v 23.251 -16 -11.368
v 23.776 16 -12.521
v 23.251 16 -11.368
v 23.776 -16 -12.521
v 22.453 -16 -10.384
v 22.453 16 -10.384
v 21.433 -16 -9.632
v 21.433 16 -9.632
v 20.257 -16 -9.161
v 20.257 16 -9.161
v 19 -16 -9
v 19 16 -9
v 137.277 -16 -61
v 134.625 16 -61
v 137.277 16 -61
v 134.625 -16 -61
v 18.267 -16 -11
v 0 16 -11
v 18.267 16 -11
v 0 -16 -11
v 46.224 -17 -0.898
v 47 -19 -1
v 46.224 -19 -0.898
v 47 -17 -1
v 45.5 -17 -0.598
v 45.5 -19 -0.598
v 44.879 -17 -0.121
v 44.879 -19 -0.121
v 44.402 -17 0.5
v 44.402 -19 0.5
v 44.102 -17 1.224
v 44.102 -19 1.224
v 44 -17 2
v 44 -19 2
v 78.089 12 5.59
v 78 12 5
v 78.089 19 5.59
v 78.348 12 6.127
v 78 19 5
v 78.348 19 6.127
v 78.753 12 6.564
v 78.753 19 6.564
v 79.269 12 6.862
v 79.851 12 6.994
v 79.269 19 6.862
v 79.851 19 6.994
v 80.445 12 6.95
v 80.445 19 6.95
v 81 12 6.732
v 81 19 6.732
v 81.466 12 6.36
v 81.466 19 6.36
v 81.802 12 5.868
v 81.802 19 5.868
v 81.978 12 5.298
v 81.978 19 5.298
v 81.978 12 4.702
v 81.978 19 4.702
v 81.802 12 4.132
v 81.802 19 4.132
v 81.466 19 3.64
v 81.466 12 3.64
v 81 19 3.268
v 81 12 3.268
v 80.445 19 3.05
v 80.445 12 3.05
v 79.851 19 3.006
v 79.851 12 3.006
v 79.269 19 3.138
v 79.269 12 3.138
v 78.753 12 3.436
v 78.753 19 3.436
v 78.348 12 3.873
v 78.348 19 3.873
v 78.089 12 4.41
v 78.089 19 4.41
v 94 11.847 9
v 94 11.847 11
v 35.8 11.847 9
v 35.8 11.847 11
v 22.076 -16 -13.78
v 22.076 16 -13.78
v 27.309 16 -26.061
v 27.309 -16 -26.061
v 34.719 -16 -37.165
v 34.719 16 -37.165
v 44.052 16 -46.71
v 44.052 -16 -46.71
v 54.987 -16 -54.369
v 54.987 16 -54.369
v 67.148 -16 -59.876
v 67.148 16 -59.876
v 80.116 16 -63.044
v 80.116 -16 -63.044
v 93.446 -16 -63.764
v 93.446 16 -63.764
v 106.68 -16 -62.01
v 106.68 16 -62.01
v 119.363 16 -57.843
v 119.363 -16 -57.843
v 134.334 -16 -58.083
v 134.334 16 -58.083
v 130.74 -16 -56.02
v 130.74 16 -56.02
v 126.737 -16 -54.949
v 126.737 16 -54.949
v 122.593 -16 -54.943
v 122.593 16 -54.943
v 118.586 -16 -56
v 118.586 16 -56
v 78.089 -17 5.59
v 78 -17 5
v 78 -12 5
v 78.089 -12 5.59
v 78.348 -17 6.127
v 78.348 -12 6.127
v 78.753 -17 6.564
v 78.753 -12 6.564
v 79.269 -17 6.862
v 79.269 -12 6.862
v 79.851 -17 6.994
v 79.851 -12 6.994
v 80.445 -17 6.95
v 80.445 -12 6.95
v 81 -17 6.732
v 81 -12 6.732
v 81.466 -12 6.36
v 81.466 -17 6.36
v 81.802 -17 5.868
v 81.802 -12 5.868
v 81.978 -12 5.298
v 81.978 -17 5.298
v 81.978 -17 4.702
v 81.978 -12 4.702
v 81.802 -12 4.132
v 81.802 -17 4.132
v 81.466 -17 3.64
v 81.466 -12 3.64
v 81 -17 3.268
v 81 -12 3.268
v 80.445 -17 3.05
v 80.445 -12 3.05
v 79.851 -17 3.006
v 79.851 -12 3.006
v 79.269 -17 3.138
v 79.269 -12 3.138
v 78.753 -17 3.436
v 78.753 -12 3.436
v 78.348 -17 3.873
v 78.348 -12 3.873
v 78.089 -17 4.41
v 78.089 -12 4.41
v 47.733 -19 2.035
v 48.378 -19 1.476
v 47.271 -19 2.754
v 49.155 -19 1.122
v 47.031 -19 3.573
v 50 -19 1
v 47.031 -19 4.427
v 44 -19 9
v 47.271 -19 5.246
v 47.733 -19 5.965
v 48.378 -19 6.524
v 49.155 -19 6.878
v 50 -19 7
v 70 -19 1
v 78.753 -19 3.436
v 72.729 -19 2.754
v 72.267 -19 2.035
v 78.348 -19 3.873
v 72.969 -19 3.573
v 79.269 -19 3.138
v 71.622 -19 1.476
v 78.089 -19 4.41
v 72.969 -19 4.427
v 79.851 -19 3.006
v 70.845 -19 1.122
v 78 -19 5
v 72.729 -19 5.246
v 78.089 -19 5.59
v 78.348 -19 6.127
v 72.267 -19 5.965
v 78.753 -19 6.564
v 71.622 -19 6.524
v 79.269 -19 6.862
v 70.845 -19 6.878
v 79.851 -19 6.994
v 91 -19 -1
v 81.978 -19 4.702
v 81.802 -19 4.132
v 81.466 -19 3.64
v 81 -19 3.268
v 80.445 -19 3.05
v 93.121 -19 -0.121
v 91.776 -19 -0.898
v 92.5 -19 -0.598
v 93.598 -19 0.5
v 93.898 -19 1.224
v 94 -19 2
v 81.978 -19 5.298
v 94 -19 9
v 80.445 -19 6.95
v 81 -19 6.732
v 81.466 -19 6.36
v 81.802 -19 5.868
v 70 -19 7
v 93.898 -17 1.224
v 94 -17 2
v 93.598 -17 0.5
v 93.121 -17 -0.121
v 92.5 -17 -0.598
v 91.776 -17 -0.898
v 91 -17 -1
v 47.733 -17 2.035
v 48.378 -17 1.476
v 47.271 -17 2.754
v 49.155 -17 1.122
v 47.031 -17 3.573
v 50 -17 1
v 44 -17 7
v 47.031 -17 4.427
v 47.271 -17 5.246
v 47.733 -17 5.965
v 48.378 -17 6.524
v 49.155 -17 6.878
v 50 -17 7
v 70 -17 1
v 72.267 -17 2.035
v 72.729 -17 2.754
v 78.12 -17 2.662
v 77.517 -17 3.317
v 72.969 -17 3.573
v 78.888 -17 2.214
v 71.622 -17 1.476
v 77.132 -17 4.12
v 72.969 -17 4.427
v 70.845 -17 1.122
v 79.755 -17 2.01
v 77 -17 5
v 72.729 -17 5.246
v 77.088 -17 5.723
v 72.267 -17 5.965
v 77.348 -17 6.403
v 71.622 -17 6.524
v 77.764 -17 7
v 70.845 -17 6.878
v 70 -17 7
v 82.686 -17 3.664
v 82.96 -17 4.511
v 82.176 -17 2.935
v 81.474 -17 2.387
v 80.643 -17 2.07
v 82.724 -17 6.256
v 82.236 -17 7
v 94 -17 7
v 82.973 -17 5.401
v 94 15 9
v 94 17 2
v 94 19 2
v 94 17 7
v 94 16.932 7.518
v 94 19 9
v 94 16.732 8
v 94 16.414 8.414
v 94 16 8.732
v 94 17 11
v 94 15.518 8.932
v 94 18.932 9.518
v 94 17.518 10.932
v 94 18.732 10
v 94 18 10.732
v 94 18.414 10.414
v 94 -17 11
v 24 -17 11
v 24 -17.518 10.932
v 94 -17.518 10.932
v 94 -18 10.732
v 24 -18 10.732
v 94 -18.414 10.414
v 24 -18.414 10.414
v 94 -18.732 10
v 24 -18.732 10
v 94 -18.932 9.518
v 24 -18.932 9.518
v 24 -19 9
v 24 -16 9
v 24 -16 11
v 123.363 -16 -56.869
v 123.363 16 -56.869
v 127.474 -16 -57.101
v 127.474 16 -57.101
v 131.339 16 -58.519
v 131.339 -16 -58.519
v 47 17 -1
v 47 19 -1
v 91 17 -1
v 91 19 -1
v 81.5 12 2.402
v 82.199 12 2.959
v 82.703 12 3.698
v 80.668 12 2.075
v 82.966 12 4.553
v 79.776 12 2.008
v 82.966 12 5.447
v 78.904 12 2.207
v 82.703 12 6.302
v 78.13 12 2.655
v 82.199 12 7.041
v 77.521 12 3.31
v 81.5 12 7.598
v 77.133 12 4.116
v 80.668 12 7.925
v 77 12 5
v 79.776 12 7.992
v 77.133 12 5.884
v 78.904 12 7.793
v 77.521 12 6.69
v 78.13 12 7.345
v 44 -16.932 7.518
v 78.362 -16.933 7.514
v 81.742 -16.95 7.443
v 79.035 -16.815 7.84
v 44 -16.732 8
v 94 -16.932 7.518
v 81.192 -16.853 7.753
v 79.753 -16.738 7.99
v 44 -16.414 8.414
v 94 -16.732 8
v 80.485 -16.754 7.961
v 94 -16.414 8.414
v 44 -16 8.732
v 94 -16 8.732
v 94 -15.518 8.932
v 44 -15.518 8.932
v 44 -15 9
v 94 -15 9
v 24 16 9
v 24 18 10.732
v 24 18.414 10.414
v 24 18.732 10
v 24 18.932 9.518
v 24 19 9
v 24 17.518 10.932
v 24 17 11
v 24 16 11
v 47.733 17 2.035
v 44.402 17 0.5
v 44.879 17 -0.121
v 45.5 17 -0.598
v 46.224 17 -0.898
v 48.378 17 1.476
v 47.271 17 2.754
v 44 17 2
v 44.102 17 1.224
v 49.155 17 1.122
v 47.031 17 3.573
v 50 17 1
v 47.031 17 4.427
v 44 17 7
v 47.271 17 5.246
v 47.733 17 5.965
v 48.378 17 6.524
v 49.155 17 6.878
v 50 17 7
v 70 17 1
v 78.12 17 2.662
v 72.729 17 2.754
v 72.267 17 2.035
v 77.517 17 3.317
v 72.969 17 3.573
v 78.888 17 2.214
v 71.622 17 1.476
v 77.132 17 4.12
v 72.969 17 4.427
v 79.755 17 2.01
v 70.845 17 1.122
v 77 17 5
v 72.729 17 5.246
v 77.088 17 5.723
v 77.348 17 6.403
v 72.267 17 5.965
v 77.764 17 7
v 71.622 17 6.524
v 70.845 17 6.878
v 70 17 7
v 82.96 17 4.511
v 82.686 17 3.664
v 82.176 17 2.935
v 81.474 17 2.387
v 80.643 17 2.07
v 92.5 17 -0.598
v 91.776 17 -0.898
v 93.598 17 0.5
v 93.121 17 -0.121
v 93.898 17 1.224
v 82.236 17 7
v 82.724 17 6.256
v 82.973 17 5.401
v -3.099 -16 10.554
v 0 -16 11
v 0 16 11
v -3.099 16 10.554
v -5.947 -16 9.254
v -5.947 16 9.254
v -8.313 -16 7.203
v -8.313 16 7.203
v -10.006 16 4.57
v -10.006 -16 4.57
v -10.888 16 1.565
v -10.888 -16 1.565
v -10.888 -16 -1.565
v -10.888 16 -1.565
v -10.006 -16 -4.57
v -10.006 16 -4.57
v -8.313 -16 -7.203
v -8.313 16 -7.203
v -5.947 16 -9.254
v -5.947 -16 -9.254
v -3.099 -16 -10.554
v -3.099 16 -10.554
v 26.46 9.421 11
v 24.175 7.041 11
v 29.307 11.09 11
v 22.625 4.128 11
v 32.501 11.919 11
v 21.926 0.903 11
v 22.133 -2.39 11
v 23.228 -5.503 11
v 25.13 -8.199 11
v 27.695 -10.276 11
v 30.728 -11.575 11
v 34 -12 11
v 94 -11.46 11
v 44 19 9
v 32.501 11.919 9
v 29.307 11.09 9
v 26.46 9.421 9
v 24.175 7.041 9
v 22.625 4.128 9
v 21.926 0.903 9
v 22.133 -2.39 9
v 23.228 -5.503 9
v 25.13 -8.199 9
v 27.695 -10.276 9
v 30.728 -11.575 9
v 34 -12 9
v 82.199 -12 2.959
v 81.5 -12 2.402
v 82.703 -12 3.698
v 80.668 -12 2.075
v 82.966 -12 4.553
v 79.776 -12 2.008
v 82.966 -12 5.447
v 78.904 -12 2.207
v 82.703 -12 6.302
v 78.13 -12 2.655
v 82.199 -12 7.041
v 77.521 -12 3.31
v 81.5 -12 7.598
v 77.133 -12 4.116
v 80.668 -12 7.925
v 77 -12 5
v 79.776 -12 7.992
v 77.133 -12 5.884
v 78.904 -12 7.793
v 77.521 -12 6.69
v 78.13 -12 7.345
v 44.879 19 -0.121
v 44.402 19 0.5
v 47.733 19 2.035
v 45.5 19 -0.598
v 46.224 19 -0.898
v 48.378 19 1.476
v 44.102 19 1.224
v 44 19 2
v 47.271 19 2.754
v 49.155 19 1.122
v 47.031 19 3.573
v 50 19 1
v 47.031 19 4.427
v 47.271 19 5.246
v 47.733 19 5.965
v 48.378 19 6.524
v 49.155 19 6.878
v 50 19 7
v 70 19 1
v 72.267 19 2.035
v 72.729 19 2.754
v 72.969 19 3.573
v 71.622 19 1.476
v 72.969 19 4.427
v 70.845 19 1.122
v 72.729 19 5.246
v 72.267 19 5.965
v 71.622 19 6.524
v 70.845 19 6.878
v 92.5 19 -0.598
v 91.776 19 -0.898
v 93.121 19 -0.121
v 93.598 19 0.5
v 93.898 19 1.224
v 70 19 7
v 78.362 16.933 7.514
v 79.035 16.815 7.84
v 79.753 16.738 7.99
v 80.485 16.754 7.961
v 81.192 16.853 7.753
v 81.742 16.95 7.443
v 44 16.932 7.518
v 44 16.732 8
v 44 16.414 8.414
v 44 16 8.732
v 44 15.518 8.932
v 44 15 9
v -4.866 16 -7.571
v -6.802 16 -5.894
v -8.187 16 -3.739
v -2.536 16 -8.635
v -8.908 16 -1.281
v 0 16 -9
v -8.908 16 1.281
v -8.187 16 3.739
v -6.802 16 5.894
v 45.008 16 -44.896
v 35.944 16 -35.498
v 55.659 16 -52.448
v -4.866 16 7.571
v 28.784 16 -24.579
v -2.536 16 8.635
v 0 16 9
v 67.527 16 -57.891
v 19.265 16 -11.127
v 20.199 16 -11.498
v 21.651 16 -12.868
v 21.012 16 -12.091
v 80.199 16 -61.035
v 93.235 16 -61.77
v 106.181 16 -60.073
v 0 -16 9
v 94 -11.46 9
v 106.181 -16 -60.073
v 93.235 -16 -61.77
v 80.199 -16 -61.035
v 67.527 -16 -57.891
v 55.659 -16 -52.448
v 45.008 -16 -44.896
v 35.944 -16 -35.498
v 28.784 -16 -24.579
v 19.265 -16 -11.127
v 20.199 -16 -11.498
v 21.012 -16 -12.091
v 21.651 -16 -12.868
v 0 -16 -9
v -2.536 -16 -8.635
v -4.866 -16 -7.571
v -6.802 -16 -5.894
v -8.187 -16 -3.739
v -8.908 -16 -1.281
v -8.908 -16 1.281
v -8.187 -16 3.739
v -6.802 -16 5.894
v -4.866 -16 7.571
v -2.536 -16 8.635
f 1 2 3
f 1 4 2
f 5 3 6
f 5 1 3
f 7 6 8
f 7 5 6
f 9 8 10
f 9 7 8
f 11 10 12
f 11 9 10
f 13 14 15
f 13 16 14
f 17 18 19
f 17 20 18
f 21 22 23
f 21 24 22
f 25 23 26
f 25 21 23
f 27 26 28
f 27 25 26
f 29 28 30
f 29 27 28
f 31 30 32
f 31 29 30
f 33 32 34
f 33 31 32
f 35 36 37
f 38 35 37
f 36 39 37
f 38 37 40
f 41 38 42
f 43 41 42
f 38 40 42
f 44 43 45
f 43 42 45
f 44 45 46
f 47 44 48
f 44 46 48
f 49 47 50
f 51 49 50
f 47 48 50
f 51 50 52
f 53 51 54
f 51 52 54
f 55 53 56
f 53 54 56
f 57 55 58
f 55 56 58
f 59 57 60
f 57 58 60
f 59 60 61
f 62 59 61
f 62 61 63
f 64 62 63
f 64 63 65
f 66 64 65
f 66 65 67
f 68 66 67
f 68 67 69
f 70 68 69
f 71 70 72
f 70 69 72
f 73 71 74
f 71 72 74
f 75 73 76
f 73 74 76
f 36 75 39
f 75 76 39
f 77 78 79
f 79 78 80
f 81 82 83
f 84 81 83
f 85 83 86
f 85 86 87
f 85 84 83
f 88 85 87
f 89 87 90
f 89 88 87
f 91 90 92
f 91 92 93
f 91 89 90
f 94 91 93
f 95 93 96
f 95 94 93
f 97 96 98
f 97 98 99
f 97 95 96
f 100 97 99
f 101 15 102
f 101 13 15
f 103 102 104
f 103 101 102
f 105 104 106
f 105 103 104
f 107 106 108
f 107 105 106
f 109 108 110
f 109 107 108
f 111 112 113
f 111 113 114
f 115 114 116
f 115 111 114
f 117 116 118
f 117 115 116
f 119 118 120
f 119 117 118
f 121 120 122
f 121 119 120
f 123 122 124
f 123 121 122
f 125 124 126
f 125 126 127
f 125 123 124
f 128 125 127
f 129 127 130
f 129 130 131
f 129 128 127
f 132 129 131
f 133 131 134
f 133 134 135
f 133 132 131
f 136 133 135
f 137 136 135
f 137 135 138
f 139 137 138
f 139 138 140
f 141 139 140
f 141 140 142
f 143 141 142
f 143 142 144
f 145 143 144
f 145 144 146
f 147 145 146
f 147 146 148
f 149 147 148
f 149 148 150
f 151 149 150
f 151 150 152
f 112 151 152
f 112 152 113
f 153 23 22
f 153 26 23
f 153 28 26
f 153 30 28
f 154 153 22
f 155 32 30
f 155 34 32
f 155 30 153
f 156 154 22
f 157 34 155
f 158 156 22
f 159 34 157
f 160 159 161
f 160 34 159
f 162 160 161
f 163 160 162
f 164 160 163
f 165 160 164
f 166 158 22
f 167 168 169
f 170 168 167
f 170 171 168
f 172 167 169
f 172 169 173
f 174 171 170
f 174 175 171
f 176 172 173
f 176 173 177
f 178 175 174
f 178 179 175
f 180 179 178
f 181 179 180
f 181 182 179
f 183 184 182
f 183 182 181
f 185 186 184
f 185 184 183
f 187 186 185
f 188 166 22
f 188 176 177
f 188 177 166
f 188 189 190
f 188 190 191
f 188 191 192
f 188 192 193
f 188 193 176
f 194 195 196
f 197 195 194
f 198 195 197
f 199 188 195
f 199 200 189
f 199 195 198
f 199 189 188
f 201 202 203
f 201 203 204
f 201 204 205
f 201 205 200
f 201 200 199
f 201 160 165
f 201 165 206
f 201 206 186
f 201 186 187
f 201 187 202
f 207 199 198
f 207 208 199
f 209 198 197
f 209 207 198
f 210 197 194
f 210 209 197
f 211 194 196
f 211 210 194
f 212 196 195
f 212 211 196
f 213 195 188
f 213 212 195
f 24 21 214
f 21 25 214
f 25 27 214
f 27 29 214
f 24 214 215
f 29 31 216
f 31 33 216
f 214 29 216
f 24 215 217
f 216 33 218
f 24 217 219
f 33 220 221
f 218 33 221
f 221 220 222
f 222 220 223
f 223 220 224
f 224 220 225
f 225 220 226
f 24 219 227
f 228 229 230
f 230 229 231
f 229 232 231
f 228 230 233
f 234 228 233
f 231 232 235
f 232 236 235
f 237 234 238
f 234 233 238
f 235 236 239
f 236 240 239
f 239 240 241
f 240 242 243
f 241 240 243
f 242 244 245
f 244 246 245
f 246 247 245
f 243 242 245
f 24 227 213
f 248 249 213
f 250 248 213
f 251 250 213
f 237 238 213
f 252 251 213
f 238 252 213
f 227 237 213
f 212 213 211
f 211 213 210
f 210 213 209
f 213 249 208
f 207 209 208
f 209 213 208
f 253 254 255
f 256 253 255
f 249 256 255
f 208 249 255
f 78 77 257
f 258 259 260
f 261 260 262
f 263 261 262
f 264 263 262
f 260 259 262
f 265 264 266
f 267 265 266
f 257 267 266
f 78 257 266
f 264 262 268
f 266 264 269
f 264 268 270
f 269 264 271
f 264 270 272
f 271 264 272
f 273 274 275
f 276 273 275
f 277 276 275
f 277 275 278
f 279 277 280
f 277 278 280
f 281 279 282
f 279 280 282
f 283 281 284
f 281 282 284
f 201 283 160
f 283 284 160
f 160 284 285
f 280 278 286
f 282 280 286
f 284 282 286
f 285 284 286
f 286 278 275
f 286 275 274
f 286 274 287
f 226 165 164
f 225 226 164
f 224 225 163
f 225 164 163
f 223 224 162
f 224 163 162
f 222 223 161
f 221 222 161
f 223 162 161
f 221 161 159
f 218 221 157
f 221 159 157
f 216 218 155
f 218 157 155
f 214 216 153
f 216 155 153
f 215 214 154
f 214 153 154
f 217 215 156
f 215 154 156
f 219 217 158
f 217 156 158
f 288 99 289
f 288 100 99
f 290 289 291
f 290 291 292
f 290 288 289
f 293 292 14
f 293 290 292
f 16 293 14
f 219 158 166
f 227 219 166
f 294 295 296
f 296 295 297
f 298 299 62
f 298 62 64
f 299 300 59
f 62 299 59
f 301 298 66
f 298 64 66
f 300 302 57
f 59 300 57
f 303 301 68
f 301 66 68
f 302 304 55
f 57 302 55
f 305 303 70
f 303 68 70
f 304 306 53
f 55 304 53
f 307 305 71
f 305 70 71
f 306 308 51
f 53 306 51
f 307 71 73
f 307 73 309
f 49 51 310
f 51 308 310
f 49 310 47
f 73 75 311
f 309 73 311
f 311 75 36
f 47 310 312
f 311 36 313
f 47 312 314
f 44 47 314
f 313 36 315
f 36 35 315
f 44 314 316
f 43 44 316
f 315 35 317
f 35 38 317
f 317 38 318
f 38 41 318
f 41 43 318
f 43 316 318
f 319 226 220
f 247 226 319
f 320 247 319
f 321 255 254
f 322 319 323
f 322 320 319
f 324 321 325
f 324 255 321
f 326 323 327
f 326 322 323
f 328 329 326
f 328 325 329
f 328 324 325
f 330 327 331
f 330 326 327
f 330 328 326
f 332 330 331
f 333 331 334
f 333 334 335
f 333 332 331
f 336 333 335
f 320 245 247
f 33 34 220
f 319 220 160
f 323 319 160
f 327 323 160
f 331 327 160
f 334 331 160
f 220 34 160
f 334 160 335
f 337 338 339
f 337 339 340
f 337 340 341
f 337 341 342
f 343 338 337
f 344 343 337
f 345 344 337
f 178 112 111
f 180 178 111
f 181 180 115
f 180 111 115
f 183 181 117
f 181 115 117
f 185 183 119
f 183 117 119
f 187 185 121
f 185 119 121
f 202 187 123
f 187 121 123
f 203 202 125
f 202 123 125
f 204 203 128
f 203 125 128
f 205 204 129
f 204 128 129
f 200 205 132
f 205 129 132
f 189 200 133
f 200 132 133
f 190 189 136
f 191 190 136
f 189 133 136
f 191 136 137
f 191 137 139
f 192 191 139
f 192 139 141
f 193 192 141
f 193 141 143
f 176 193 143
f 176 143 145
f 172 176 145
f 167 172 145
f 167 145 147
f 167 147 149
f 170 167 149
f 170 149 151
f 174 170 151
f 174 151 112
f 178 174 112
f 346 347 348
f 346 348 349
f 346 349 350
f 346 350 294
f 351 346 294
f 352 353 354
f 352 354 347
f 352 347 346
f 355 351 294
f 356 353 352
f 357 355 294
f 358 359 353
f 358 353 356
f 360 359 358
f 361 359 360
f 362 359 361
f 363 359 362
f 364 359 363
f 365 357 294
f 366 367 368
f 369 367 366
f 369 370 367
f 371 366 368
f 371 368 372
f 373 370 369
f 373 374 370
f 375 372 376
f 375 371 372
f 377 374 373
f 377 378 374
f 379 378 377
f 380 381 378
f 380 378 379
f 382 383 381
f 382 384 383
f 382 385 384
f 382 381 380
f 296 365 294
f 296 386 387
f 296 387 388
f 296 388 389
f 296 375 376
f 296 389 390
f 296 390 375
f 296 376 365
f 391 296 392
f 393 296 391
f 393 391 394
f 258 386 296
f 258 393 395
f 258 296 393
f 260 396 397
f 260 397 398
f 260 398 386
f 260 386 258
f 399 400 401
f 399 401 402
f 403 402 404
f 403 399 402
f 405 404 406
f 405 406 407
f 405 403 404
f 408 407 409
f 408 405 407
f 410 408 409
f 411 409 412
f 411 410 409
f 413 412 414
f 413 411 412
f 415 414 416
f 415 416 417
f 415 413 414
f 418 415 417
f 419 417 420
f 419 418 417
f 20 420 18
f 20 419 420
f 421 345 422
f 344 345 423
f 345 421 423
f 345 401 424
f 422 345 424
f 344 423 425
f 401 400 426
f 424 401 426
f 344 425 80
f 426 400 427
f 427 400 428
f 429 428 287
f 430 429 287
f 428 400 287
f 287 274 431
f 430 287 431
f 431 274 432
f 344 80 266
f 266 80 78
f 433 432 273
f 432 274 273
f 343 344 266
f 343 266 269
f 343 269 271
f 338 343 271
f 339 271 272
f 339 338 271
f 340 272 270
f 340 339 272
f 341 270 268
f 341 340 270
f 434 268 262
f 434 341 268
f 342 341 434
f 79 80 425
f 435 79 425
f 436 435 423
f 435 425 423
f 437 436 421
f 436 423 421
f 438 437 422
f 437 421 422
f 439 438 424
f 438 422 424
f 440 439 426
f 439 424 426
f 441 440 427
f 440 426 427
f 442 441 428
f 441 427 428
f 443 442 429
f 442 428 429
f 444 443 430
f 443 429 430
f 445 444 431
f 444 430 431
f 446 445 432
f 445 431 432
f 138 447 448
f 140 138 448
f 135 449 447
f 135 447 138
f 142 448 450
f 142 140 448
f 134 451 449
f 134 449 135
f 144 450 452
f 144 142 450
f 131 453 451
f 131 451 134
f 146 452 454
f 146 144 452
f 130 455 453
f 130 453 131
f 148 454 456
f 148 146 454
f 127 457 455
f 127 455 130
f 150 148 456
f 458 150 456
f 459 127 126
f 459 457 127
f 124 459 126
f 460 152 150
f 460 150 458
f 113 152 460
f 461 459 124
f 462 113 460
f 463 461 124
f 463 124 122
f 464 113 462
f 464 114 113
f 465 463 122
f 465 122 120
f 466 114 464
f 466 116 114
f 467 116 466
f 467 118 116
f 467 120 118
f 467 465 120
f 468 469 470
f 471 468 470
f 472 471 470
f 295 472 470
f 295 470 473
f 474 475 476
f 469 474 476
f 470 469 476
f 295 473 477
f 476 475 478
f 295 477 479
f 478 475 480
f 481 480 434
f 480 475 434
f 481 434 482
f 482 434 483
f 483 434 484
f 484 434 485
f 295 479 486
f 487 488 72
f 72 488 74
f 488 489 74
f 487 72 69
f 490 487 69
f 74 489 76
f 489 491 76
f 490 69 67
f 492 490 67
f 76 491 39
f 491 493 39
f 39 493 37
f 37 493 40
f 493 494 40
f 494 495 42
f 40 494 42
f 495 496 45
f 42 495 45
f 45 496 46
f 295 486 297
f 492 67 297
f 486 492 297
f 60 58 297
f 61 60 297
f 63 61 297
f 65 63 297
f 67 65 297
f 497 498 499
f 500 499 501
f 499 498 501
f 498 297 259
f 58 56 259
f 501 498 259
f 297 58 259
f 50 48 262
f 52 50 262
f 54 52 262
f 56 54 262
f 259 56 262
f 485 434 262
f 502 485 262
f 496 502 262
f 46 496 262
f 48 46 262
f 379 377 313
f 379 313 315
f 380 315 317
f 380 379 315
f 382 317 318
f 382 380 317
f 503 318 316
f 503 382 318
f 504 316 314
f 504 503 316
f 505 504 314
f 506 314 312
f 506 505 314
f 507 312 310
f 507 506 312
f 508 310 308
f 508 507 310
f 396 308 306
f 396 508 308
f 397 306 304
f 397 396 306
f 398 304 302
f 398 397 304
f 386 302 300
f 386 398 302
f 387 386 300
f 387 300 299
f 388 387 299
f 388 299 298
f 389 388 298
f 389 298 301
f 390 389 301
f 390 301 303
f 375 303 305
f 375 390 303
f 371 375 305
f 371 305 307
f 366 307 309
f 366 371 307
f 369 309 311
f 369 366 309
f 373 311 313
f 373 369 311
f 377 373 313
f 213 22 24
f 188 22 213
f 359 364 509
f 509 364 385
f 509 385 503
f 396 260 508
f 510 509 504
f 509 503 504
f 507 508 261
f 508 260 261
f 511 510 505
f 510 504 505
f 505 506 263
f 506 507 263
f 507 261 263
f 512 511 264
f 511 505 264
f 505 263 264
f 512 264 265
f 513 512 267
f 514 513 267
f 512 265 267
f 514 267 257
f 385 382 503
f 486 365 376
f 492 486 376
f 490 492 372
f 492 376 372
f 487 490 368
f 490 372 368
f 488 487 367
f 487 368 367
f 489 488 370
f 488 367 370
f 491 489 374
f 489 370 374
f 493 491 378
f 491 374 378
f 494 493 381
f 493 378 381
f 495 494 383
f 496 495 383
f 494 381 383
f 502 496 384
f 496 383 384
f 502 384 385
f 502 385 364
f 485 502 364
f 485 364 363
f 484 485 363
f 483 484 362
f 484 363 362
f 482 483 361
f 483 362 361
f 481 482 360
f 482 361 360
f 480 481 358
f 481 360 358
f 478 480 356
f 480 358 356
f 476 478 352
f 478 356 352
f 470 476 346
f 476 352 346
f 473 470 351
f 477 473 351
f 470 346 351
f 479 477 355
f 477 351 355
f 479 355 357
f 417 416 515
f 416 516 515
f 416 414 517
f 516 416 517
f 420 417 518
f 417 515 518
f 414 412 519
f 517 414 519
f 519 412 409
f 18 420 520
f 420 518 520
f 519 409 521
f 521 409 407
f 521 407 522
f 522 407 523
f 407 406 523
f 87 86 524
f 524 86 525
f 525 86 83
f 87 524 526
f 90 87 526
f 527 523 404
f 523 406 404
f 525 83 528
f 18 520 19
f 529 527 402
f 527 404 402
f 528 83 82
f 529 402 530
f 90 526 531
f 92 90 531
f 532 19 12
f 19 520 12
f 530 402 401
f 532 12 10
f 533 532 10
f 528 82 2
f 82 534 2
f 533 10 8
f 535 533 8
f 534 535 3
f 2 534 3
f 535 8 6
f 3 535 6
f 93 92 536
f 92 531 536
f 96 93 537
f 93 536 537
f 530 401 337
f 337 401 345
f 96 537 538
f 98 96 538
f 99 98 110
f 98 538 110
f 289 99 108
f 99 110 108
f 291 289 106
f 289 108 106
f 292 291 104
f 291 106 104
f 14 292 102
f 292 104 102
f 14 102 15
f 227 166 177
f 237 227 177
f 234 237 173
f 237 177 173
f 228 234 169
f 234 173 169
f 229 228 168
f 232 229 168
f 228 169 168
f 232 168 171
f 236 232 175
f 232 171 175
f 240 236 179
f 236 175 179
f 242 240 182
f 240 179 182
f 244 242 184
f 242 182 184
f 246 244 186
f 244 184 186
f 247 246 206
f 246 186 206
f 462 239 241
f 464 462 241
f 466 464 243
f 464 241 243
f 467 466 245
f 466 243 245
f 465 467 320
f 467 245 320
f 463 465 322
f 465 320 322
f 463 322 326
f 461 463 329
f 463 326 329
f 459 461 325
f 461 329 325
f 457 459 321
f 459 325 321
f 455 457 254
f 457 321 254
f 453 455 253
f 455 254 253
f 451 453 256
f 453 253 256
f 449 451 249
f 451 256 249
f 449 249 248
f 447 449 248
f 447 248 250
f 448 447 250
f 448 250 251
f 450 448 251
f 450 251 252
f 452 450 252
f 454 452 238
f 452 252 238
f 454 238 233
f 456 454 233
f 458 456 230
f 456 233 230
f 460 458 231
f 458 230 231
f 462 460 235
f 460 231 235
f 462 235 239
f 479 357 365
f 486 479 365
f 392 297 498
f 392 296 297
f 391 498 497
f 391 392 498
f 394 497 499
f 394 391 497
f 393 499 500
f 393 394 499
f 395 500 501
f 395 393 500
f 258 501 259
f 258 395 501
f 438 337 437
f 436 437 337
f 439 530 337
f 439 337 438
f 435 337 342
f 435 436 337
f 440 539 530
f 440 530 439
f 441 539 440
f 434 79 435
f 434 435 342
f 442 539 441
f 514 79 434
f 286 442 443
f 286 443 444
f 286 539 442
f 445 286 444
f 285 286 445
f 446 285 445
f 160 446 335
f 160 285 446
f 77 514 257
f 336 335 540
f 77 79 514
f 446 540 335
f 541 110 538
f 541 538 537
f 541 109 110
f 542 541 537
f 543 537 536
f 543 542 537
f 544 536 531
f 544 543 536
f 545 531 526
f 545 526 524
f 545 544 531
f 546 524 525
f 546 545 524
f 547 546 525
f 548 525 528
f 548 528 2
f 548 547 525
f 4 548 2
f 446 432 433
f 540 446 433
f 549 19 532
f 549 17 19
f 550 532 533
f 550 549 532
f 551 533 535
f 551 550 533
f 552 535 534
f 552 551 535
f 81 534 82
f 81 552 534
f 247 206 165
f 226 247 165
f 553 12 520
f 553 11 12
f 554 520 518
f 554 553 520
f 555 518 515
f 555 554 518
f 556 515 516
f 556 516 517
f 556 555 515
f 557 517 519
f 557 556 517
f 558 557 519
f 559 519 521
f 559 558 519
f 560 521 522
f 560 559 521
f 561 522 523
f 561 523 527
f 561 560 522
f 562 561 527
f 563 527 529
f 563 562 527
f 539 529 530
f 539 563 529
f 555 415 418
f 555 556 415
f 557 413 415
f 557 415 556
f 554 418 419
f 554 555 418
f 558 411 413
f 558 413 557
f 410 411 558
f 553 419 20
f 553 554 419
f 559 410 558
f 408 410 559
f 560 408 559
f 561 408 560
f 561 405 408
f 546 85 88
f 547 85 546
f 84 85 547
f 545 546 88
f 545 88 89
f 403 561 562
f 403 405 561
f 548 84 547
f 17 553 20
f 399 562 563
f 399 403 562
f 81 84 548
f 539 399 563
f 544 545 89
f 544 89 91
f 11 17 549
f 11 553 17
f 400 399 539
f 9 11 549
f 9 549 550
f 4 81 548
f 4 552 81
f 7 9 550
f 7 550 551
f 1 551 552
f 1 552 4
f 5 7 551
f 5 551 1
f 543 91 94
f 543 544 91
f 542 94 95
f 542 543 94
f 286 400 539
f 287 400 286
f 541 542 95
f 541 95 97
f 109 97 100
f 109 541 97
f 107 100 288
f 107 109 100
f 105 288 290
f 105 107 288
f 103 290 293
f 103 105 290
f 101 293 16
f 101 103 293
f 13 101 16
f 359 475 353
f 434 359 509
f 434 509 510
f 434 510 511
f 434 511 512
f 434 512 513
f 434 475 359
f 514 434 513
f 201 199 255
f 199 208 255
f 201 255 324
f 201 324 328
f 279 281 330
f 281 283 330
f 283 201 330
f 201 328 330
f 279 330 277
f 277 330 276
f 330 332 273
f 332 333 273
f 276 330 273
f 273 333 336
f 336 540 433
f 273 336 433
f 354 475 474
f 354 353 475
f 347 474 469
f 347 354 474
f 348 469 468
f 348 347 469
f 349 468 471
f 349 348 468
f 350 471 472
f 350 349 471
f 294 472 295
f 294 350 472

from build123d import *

# Parameters (mm, degrees)
F1_DEPTH  = 16
F2_W      = 70
F2_H      = 3
F3_DEPTH  = 2
F4_W      = 50
F4_H      = 12
F5_DEPTH  = 2
F6_R      = 2
F9_DEPTH  = 2
F11_DEPTH = 38.001
F13_D     = 4
F14_R     = 3
F14_R_2   = 2
F15_DEPTH = 5
F16_R     = 3


# Not quite as in the source:
# - a pattern or mirror of a feature is missing from the dataset's text; its kind, count and spacing are read off the source's solid


with BuildPart() as f1:
    # F0 (on Front) → F1 (new body)
    with BuildSketch(Plane.XZ):
        with BuildLine():
            ThreePointArc((0, -9), (-9, 0), (0, 9))
            Line((0, 9), (94, 9))
            Line((94, 9), (94, 11))
            Line((94, 11), (0, 11))
            ThreePointArc((0, 11), (-11, 0), (0, -11))
            Line((0, -11), (18.2665281953, -11))
            ThreePointArc((18.2665281953, -11), (20.6244584971, -11.7688756304), (22.0759112253, -13.779917654))
            ThreePointArc((22.0759112253, -13.779917654), (60.9393672504, -57.4049197249), (119.3629664678, -57.8431826489))
            ThreePointArc((119.3629664678, -57.8431826489), (127.4740086729, -57.1014451531), (134.6252638265, -61))
            Line((134.6252638265, -61), (137.2771081943, -61))
            ThreePointArc((137.2771081943, -61), (128.7730913255, -55.3547464626), (118.5862940723, -56))
            ThreePointArc((118.5862940723, -56), (61.4655553189, -55.4468201567), (23.7763203843, -12.5212290284))
            ThreePointArc((23.7763203843, -12.5212290284), (21.9669972314, -9.9754593518), (19, -9))
            Line((19, -9), (0, -9))
        make_face()
    extrude(amount=F1_DEPTH)

    # F2 (on face) → F3 (join)
    with BuildSketch(Plane.XY.offset(11)):
        with Locations((59, -17.5)):
            Rectangle(F2_W, F2_H)
    extrude(amount=-F3_DEPTH)

    # F4 (on face) → F5 (join)
    with BuildSketch(Plane.XZ.offset(19)):
        with Locations((69, 5)):
            Rectangle(F4_W, F4_H)
    extrude(amount=-F5_DEPTH)

    # F6
    f6_edges = [f1.edges().sort_by_distance(p)[0] for p in [
        (59, -19, 11),
        (69, -17, 9),
    ]]
    fillet(f6_edges, radius=F6_R)

    # F7: F1 across plane


with BuildPart() as f1_1:
    add(f1.part)
    add(f1.part.mirror(Plane.XZ))

    # F8 (on face) → F9 (cut)
    with BuildSketch(Plane.XY.offset(11)):
        with BuildLine():
            Line((94, 11.8473697647), (35.7999188125, 11.8473697647))
            ThreePointArc((35.7999188125, 11.8473697647), (21.9261214029, 0.9031688421), (34, -11.9995147554))
            Line((34, -11.9995147554), (94, -11.4599181938))
            Line((94, -11.4599181938), (94, 11.8473697647))
        make_face()
    extrude(amount=-F9_DEPTH, mode=Mode.SUBTRACT)

    # F10 (on face) → F11 (cut, through all)
    with BuildSketch(Plane.XZ.offset(19)):
        with BuildLine():
            ThreePointArc((50, 7), (47, 4), (50, 1))
            Line((50, 1), (70, 1))
            ThreePointArc((70, 1), (73, 4), (70, 7))
            Line((70, 7), (50, 7))
        make_face()
    extrude(amount=-F11_DEPTH, mode=Mode.SUBTRACT)

    # F13 (through all)
    with Locations(Plane.XZ.offset(19)):
        with Locations((80, 5)):
            Hole(F13_D / 2)

    # F14 (on face) → F15 (join)
    with BuildSketch(Plane(origin=(0, -17, 0), x_dir=(-1, 0, 0), z_dir=(0, 1, 0))):
        with Locations((-80, 5)):
            Circle(F14_R)
        with Locations((-80, 5)):
            Circle(F14_R_2, mode=Mode.SUBTRACT)
    f15 = extrude(amount=F15_DEPTH)

    # F15_copies: F15 across plane
    add(f15.mirror(Plane.ZX))

    # F16
    f16_edges = [f1_1.edges().sort_by_distance(p)[0] for p in [
        (94, -18, -1),
        (94, 18, -1),
        (44, 18, -1),
        (44, -18, -1),
    ]]
    fillet(f16_edges, radius=F16_R)


solid = f1_1.part
